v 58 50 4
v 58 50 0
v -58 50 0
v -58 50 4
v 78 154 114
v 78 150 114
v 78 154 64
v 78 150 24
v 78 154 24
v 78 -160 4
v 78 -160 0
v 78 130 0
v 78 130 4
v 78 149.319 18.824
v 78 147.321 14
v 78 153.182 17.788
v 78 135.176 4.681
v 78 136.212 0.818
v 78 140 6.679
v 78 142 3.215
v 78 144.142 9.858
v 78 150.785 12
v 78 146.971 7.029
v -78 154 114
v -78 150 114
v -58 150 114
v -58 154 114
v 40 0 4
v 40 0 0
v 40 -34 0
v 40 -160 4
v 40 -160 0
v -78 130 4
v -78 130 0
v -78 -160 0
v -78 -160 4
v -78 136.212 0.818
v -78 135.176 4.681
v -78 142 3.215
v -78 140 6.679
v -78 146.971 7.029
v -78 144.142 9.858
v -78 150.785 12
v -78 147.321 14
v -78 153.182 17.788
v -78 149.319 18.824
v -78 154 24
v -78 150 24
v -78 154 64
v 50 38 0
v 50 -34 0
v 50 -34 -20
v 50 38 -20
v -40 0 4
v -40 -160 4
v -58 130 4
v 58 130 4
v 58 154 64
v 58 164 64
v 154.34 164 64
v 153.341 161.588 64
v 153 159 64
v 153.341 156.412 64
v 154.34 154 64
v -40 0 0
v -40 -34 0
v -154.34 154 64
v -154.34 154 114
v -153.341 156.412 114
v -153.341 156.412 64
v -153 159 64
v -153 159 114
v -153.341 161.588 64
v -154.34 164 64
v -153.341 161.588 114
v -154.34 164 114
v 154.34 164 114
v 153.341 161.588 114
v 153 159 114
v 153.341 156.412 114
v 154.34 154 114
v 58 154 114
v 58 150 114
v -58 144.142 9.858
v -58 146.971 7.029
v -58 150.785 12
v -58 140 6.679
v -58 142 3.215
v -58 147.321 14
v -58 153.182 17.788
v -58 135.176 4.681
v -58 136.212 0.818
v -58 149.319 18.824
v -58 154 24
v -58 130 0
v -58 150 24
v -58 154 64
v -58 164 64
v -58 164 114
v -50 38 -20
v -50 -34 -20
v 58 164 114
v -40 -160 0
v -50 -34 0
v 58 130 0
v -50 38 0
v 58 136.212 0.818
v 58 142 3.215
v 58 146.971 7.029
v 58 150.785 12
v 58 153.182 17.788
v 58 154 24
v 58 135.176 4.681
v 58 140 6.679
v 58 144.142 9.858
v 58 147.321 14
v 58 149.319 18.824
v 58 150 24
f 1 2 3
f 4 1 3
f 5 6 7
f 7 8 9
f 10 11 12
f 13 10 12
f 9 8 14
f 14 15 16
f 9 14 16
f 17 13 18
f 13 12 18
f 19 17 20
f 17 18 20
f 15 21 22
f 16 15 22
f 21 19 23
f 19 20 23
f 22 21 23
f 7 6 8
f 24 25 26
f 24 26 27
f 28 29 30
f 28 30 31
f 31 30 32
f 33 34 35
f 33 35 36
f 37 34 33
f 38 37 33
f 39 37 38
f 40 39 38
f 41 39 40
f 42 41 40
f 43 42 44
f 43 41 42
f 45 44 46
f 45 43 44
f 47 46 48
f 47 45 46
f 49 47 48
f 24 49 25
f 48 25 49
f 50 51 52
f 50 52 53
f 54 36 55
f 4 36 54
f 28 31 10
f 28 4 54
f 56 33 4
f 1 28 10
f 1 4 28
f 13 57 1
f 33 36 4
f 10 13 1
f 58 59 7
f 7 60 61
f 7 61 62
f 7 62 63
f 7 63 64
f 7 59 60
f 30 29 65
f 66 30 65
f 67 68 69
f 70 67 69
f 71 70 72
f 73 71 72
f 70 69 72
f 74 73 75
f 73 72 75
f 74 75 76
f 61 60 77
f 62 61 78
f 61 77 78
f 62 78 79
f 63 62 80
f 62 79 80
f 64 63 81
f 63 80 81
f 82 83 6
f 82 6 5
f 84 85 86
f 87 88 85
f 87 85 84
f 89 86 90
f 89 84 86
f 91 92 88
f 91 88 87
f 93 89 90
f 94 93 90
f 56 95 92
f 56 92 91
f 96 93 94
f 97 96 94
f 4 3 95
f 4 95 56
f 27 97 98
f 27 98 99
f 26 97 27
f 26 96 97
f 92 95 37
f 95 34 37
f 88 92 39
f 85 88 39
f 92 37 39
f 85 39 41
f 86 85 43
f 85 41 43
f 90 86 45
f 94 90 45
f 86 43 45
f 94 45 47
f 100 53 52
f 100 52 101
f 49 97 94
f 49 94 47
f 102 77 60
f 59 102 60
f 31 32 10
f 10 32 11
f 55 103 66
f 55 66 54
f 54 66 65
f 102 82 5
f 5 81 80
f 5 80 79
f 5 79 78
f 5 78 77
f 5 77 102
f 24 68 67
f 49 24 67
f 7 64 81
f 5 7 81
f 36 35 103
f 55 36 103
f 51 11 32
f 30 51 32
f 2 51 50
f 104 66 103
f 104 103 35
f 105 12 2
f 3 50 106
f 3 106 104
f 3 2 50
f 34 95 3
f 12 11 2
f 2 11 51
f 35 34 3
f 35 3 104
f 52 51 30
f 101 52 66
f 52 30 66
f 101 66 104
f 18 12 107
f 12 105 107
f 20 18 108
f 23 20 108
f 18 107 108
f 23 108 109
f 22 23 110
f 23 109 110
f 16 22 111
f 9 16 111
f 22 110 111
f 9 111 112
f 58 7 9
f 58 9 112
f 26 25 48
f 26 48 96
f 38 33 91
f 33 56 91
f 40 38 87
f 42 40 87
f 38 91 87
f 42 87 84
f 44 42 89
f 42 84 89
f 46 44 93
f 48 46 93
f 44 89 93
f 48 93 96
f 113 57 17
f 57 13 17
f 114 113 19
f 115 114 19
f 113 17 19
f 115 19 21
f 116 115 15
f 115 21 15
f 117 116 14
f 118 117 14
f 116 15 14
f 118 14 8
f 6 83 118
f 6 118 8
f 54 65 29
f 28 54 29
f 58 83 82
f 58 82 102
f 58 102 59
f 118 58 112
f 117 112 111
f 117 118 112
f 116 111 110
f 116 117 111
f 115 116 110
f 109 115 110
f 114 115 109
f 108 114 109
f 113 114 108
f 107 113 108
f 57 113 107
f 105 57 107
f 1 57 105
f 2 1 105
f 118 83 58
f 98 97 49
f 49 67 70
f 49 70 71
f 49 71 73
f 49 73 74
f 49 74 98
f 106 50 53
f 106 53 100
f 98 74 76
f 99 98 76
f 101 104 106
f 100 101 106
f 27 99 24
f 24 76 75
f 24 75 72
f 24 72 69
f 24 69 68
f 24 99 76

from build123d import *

# Parameters (mm, degrees)
EXTRUDE_1_DEPTH     = 4
SKETCH_2_W          = 100
SKETCH_2_H          = 72
EXTRUDE_2_DEPTH     = 20
SKETCH_4_W          = 20
SKETCH_4_H          = 4
SKETCH_7_W          = 50
SKETCH_7_H          = 10
SKETCH_9_W          = 50
SKETCH_9_H          = 10
SKETCH_12_R         = 10
CUT_EXTRUDE_1_DEPTH = 265.227174984


with BuildPart() as part:
    # 草图1 → 凸台-拉伸1 (new body)
    with BuildSketch(Plane.XY):
        Polygon((-40, 0), (40, 0), (40, -160), (78, -160), (78, 0), (78, 50), (-78, 50), (-78, 0), (-78, -160), (-40, -160), align=None)
    extrude(amount=EXTRUDE_1_DEPTH)

    # 草图2 → 凸台-拉伸2 (add)
    with BuildSketch(Plane(origin=(0, 0, 0), x_dir=(-1, 0, 0), z_dir=(0, 0, -1))):
        with Locations((0, 2)):
            Rectangle(SKETCH_2_W, SKETCH_2_H)
    extrude(amount=EXTRUDE_2_DEPTH)

    # 扫描1: sweep along a path in 草图5
    with BuildLine(Plane.ZY.offset(78)) as sweep_1_path:
        Line((0, 50), (0, 130))
        ThreePointArc((0, 130), (7.029437252, 146.970562748), (24, 154))
        Line((24, 154), (114, 154))
    # 草图4 → 扫描1 (sweep)
    with BuildSketch(Plane(origin=(0, 50, 0), x_dir=(1, 0, 0), z_dir=(0, 1, 0))):
        with Locations((-68, -2)):
            Rectangle(SKETCH_4_W, SKETCH_4_H)
        with Locations((68, -2)):
            Rectangle(SKETCH_4_W, SKETCH_4_H)
    sweep(path=sweep_1_path.line)

    # 扫描2: sweep along a path in 草图8
    with BuildLine(Plane.XY.offset(114)) as sweep_2_path:
        Line((-58, 154), (-158, 154))
    # 草图7 → 扫描2 (sweep)
    with BuildSketch(Plane(origin=(-58, 0, 0), x_dir=(0, 0, -1), z_dir=(1, 0, 0))):
        with Locations((-89, 159)):
            Rectangle(SKETCH_7_W, SKETCH_7_H)
    sweep(path=sweep_2_path.line)

    # 扫描3: sweep along a path in 草图10
    with BuildLine(Plane.XY.offset(114)) as sweep_3_path:
        Line((58, 154), (158, 154))
    # 草图9 → 扫描3 (sweep)
    with BuildSketch(Plane.ZY.offset(-58)):
        with Locations((89, 159)):
            Rectangle(SKETCH_9_W, SKETCH_9_H)
    sweep(path=sweep_3_path.line)

    # 草图12 → 切除-拉伸1 (cut, through all)
    with BuildSketch(Plane.XY.offset(114)):
        with Locations((-163, 159)):
            Circle(SKETCH_12_R)
        with Locations((163, 159)):
            Circle(SKETCH_12_R)
    extrude(amount=-CUT_EXTRUDE_1_DEPTH, mode=Mode.SUBTRACT)


solid = part.part
